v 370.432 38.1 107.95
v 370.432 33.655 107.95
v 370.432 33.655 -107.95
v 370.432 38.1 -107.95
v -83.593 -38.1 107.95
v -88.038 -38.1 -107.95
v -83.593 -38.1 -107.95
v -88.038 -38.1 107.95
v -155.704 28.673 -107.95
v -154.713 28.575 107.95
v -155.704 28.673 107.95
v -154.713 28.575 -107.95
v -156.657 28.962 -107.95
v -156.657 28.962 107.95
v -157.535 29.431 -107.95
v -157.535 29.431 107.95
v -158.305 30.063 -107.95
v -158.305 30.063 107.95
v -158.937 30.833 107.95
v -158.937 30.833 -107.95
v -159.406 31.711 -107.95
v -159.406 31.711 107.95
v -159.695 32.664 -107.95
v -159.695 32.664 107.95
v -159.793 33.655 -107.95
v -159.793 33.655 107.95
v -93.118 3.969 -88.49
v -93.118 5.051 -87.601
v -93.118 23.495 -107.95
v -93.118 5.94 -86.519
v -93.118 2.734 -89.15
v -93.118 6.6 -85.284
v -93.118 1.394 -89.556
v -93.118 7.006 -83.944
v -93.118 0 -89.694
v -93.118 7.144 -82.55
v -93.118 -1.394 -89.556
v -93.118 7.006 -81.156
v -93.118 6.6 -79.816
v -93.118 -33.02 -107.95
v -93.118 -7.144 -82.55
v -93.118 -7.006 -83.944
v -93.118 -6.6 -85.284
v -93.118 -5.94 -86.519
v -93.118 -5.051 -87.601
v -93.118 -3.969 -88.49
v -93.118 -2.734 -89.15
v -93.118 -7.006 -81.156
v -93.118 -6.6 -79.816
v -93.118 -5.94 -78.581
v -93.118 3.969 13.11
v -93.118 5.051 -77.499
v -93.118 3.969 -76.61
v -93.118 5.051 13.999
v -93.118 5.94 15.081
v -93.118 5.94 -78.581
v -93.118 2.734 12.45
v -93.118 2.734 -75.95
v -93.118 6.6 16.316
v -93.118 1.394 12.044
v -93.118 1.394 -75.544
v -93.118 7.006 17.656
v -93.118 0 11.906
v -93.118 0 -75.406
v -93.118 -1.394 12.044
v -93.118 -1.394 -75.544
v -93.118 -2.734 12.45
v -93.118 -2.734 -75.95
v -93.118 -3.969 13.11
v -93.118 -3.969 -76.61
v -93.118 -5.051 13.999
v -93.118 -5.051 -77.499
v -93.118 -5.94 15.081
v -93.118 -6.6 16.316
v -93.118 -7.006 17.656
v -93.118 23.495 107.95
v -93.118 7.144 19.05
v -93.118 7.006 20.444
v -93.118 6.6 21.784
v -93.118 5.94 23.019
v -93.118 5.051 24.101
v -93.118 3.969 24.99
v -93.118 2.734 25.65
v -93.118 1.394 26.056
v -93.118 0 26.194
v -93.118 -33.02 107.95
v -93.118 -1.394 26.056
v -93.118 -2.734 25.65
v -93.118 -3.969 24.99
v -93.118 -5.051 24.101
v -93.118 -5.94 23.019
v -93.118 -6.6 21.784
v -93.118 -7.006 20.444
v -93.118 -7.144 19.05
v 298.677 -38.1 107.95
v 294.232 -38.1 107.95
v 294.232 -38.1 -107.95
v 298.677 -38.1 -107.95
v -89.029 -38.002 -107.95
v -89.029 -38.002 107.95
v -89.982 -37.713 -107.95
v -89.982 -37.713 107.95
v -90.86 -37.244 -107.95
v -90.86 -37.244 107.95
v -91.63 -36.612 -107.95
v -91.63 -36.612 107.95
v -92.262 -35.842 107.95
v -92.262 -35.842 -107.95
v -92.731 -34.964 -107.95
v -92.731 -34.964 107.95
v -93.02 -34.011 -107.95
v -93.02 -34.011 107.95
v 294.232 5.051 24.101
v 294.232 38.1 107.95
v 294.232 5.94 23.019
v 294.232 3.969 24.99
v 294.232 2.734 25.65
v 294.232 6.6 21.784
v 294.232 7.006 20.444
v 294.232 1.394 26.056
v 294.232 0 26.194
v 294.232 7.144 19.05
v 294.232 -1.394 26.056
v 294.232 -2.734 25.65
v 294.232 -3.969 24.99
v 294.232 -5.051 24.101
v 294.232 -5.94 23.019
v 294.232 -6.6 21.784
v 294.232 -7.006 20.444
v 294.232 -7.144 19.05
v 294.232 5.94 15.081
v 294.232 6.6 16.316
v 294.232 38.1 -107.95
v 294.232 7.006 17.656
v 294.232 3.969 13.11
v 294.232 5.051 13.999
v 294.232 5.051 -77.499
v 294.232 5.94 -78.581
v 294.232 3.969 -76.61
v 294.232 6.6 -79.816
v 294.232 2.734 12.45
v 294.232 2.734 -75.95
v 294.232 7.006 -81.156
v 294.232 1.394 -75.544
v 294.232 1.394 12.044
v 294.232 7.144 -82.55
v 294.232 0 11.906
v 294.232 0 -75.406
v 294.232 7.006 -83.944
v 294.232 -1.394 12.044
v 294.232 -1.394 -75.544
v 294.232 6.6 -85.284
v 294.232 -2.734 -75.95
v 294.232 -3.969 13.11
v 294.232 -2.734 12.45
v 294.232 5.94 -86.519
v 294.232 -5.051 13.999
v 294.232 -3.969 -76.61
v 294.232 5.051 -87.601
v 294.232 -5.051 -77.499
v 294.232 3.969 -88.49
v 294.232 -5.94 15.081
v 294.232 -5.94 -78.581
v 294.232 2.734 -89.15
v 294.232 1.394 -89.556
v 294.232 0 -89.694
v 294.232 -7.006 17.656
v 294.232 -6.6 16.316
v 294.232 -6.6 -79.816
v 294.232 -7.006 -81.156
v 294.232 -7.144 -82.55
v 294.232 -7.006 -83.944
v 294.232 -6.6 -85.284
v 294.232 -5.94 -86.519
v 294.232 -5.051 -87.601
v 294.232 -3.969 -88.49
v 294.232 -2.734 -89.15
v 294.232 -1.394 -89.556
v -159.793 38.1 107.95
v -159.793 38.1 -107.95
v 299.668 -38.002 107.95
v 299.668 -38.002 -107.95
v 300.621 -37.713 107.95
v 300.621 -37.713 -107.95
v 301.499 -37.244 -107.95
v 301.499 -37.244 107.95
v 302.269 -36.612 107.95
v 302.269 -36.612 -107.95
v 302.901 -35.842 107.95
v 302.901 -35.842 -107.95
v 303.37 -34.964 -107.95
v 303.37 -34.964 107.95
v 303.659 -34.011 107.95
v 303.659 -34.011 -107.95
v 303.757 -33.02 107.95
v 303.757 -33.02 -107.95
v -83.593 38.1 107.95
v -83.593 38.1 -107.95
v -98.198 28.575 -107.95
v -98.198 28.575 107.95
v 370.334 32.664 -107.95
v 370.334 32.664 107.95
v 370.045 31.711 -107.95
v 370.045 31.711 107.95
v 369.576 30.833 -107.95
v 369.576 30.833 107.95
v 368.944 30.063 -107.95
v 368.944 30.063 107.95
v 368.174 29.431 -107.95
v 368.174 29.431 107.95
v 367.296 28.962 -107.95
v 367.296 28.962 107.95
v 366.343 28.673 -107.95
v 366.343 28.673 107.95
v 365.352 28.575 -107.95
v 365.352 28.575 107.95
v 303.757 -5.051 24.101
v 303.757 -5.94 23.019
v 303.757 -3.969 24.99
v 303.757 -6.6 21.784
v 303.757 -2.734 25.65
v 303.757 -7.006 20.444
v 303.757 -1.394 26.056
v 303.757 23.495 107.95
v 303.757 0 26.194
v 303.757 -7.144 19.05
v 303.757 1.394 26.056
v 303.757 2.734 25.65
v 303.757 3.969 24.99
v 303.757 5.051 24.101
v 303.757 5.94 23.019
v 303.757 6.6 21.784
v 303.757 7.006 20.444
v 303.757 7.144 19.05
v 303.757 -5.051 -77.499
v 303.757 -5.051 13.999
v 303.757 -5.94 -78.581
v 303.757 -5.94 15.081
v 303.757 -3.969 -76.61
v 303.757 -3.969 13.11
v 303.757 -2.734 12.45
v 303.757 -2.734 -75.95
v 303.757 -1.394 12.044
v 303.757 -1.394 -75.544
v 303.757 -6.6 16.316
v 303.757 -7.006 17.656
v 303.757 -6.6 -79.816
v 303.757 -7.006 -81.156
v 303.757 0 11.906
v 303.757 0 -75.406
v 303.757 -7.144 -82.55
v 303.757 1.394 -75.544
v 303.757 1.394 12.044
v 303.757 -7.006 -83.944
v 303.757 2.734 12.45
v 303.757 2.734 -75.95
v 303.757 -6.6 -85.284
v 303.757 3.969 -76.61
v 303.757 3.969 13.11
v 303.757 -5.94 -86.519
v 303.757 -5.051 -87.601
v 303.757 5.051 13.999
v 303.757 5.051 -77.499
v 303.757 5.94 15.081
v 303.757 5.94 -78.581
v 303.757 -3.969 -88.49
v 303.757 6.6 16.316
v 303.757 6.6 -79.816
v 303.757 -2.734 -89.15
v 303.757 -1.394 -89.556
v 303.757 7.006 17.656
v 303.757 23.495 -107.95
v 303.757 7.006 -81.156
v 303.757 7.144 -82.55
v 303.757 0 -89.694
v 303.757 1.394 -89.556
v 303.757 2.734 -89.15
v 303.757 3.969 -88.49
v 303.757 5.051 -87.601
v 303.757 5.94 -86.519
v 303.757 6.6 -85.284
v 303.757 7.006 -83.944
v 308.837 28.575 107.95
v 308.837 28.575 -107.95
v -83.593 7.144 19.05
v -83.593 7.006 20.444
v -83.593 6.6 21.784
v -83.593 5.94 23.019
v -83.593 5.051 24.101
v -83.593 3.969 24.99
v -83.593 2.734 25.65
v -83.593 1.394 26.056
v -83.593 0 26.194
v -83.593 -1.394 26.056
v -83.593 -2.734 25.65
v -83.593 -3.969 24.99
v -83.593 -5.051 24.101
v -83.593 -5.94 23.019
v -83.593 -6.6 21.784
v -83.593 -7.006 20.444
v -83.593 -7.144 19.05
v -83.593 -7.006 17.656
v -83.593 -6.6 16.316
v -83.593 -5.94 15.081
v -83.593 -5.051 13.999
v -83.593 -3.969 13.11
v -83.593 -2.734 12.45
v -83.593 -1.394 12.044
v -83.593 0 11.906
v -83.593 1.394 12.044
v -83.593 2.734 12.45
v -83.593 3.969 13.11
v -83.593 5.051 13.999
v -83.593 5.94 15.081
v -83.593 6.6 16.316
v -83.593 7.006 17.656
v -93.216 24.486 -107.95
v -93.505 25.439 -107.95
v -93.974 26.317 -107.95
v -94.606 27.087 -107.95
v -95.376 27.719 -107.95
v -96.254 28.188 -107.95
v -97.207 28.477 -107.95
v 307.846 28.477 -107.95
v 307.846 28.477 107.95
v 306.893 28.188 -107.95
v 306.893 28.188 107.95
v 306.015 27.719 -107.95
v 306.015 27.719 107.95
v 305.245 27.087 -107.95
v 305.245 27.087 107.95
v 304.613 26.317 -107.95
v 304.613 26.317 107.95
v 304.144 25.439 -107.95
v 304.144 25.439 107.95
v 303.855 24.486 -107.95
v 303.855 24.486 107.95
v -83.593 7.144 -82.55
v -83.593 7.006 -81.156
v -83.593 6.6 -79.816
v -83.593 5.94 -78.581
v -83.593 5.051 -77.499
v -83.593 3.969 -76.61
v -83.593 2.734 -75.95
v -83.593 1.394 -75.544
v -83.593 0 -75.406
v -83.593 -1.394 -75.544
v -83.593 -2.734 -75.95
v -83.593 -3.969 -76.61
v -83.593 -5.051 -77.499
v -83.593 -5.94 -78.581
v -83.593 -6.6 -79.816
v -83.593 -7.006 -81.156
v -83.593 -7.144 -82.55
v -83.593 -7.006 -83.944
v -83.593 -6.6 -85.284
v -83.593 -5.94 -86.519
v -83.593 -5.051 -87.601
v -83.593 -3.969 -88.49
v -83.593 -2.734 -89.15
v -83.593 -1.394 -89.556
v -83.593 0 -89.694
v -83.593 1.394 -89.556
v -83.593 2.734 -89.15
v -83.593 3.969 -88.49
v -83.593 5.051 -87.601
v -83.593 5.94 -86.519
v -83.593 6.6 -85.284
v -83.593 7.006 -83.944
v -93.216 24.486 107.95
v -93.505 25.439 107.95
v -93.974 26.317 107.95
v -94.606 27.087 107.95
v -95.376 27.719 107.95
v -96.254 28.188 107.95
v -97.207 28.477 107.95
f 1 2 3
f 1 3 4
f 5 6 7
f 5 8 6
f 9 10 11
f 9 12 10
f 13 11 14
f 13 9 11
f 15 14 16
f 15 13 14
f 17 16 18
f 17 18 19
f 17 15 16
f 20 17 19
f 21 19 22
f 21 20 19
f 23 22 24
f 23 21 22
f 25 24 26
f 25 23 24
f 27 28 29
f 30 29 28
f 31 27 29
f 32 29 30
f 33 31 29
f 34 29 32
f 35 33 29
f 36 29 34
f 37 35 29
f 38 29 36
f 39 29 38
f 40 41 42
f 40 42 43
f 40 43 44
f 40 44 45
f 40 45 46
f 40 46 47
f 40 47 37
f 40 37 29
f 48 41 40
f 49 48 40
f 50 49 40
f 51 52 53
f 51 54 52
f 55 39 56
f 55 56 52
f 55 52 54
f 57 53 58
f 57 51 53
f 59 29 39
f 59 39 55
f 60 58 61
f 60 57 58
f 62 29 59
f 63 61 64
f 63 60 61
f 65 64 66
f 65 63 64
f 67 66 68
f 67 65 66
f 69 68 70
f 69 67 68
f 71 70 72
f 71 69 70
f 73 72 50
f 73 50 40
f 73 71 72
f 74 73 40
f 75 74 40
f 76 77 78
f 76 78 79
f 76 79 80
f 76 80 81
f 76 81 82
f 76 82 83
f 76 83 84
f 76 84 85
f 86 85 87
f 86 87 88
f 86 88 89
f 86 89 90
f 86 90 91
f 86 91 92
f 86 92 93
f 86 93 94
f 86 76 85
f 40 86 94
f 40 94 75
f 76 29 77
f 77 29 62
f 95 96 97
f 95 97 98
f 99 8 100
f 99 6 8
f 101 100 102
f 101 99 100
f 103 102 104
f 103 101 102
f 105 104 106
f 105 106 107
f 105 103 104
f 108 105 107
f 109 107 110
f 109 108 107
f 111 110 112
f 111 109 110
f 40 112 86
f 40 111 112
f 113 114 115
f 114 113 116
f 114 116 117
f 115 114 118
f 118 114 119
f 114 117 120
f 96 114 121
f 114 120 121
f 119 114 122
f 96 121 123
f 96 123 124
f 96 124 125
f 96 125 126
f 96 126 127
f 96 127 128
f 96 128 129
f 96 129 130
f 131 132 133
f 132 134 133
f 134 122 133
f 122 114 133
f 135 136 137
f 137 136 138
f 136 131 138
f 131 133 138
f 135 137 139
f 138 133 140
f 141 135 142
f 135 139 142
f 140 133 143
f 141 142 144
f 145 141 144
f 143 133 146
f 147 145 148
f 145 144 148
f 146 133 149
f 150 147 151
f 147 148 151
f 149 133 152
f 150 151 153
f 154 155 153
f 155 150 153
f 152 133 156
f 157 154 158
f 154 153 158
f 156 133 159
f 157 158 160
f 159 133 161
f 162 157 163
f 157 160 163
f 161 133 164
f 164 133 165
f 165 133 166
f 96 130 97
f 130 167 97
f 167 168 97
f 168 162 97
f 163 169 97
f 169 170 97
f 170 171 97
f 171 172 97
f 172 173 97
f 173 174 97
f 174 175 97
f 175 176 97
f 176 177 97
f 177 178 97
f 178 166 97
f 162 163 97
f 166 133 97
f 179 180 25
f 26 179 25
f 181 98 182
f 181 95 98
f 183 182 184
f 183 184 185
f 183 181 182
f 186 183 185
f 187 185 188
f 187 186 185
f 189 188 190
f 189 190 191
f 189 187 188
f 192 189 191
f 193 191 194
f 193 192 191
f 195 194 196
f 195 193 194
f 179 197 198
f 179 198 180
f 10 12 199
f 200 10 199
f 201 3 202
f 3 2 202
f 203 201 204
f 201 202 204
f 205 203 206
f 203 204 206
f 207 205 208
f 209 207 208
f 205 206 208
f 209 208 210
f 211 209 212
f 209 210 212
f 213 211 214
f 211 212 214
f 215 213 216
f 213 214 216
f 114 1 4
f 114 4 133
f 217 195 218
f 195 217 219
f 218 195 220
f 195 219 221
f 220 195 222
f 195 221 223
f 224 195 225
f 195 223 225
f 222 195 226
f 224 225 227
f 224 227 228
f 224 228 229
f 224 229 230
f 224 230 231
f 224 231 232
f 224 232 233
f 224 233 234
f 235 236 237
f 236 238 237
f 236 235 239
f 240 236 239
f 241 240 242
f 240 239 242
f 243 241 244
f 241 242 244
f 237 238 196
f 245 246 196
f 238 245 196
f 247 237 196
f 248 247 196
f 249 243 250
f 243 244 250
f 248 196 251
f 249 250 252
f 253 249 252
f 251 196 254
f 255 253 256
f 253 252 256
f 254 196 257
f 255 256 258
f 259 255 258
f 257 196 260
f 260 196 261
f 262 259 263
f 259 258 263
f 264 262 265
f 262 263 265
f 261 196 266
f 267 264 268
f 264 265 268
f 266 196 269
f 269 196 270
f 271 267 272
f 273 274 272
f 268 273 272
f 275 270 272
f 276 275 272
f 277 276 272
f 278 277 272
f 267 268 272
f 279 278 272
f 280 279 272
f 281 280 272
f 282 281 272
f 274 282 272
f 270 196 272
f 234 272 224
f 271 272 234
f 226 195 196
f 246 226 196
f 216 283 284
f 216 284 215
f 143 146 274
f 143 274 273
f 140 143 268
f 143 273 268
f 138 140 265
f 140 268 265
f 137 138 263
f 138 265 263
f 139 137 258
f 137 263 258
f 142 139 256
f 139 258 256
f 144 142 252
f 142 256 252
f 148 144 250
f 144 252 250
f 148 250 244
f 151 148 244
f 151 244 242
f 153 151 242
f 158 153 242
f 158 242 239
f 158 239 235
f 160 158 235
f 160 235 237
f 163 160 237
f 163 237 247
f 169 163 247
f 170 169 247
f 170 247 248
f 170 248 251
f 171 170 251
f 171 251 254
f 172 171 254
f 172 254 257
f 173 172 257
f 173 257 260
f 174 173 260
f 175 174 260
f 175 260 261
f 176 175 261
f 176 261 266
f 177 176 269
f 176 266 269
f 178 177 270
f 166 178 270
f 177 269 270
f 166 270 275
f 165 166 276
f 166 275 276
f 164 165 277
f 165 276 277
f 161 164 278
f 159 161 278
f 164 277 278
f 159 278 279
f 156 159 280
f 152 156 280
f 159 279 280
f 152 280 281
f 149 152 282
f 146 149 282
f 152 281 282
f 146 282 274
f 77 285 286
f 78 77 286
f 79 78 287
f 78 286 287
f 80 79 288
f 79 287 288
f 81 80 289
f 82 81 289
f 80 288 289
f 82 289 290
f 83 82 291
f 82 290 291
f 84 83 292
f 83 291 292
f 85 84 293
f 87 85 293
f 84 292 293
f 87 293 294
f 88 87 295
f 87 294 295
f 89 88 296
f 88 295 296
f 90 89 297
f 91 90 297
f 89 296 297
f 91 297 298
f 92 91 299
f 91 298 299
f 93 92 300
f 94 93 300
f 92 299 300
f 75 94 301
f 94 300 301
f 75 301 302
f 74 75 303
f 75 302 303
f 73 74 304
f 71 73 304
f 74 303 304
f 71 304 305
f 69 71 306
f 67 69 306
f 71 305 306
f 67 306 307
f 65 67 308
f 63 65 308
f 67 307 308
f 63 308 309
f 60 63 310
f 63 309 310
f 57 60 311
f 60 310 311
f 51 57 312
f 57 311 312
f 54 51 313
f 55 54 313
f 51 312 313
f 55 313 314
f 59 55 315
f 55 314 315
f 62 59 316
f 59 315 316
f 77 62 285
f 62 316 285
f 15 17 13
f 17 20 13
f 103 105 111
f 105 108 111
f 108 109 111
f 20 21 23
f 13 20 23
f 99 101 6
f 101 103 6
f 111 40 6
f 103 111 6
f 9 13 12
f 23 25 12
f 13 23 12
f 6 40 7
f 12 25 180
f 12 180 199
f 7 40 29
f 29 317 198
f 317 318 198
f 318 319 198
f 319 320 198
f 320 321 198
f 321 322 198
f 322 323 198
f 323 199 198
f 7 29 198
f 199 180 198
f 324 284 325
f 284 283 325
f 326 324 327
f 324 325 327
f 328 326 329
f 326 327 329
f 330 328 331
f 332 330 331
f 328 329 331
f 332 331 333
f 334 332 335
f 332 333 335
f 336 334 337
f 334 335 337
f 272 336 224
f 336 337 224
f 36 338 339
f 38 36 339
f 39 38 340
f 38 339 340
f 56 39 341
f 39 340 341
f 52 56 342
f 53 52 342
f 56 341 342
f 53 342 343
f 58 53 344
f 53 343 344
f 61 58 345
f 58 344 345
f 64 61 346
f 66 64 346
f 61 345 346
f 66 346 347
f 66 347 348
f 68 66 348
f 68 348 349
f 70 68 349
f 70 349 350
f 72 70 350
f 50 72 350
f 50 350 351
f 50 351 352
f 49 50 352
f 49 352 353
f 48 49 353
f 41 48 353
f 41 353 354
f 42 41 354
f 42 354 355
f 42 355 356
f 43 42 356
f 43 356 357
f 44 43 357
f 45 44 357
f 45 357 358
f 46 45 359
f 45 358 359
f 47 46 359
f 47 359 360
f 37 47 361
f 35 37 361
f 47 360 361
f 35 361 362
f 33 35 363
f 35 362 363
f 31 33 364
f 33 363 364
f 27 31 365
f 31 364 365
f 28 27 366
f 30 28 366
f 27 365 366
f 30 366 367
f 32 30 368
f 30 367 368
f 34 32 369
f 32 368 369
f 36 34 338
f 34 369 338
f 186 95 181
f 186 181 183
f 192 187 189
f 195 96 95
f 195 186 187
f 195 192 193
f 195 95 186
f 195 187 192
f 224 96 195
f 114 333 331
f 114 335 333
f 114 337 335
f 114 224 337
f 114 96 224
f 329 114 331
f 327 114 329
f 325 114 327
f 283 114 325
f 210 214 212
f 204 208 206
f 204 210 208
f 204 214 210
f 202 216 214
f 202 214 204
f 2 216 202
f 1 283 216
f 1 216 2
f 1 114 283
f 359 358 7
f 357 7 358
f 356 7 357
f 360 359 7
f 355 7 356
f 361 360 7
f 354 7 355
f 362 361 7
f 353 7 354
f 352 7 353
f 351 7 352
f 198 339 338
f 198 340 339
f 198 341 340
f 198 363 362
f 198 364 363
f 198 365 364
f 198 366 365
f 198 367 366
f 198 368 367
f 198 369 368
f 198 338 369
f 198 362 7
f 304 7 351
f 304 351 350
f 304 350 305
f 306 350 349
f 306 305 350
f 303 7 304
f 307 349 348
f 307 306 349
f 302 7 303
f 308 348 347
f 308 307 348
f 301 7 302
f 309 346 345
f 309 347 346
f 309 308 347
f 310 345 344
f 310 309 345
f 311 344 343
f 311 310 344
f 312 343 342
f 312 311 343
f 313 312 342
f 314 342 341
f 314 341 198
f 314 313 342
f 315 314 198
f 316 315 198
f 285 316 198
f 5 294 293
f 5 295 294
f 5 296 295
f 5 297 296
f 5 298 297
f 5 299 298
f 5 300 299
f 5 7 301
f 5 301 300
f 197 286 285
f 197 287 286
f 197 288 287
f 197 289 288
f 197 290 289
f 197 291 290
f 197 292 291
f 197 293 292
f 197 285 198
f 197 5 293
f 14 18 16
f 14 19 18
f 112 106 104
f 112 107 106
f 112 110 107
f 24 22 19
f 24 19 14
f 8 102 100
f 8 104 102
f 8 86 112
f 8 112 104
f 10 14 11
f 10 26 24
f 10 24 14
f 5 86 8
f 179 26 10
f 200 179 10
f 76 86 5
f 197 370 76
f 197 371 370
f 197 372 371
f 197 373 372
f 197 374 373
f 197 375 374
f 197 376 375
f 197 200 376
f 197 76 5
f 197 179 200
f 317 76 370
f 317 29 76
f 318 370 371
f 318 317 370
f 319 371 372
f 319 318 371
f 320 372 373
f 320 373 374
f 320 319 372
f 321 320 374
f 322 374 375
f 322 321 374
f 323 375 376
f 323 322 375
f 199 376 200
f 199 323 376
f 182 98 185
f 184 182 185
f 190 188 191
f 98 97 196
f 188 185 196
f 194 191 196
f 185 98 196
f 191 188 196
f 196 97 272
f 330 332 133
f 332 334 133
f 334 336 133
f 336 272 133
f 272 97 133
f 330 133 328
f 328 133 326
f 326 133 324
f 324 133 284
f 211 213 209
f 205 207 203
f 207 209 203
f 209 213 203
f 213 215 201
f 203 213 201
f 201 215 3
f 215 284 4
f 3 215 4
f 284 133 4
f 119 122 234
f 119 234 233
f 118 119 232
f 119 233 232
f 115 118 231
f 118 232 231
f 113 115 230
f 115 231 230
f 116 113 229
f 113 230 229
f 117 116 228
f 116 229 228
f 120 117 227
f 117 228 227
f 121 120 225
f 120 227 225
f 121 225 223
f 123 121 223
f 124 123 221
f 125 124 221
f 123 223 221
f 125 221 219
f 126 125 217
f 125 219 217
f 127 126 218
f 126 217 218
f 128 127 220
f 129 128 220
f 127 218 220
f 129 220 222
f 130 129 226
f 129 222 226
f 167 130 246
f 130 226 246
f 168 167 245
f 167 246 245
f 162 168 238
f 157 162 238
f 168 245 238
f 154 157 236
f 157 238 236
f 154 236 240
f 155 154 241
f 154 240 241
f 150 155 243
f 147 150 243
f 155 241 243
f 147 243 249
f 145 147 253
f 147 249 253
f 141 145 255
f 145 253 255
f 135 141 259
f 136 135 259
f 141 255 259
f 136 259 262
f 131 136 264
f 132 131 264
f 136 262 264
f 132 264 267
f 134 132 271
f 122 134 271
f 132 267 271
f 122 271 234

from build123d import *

# Parameters (mm, degrees)
F1_DEPTH = 107.95
F2_R     = 5.08
F3_R     = 7.14375
F4_DEPTH = 408.94
F5_R     = 7.14375
F6_DEPTH = 25.4


with BuildPart() as f1:
    # F0 (on Top) → F1 (new body, symmetric)
    with BuildSketch(Plane.XY):
        Polygon((294.232082, -38.1), (303.757082, -38.1), (303.757082, 28.575), (370.432082, 28.575), (370.432082, 38.1), (294.232082, 38.1), align=None)
        Polygon((-93.117918, -38.1), (-83.592918, -38.1), (-83.592918, 38.1), (-159.792918, 38.1), (-159.792918, 28.575), (-93.117918, 28.575), align=None)
    extrude(amount=F1_DEPTH, both=True)

    # F2
    f2_edges = [f1.edges().sort_by_distance(p)[0] for p in [
        (-159.792918, 28.575, 0),
        (-93.117918, 28.575, 0),
        (-93.117918, -38.1, 0),
        (303.757082, -38.1, 0),
        (303.757082, 28.575, 0),
        (370.432082, 28.575, 0),
    ]]
    fillet(f2_edges, radius=F2_R)

    # F3 (on face) → F4 (cut, symmetric)
    with BuildSketch(Plane.YZ.offset(303.757082)):
        with Locations((0, -82.55)):
            Circle(F3_R)
        with Locations((0, 19.05)):
            Circle(F3_R)
    extrude(amount=F4_DEPTH, both=True, mode=Mode.SUBTRACT)

    # F5 (on face) → F6 (cut)
    with BuildSketch(Plane.YZ.offset(-83.592918)):
        with Locations((0, -82.55)):
            Circle(F5_R)
        with Locations((0, 19.05)):
            Circle(F5_R)
    extrude(amount=-F6_DEPTH, mode=Mode.SUBTRACT)


solid = f1.part
